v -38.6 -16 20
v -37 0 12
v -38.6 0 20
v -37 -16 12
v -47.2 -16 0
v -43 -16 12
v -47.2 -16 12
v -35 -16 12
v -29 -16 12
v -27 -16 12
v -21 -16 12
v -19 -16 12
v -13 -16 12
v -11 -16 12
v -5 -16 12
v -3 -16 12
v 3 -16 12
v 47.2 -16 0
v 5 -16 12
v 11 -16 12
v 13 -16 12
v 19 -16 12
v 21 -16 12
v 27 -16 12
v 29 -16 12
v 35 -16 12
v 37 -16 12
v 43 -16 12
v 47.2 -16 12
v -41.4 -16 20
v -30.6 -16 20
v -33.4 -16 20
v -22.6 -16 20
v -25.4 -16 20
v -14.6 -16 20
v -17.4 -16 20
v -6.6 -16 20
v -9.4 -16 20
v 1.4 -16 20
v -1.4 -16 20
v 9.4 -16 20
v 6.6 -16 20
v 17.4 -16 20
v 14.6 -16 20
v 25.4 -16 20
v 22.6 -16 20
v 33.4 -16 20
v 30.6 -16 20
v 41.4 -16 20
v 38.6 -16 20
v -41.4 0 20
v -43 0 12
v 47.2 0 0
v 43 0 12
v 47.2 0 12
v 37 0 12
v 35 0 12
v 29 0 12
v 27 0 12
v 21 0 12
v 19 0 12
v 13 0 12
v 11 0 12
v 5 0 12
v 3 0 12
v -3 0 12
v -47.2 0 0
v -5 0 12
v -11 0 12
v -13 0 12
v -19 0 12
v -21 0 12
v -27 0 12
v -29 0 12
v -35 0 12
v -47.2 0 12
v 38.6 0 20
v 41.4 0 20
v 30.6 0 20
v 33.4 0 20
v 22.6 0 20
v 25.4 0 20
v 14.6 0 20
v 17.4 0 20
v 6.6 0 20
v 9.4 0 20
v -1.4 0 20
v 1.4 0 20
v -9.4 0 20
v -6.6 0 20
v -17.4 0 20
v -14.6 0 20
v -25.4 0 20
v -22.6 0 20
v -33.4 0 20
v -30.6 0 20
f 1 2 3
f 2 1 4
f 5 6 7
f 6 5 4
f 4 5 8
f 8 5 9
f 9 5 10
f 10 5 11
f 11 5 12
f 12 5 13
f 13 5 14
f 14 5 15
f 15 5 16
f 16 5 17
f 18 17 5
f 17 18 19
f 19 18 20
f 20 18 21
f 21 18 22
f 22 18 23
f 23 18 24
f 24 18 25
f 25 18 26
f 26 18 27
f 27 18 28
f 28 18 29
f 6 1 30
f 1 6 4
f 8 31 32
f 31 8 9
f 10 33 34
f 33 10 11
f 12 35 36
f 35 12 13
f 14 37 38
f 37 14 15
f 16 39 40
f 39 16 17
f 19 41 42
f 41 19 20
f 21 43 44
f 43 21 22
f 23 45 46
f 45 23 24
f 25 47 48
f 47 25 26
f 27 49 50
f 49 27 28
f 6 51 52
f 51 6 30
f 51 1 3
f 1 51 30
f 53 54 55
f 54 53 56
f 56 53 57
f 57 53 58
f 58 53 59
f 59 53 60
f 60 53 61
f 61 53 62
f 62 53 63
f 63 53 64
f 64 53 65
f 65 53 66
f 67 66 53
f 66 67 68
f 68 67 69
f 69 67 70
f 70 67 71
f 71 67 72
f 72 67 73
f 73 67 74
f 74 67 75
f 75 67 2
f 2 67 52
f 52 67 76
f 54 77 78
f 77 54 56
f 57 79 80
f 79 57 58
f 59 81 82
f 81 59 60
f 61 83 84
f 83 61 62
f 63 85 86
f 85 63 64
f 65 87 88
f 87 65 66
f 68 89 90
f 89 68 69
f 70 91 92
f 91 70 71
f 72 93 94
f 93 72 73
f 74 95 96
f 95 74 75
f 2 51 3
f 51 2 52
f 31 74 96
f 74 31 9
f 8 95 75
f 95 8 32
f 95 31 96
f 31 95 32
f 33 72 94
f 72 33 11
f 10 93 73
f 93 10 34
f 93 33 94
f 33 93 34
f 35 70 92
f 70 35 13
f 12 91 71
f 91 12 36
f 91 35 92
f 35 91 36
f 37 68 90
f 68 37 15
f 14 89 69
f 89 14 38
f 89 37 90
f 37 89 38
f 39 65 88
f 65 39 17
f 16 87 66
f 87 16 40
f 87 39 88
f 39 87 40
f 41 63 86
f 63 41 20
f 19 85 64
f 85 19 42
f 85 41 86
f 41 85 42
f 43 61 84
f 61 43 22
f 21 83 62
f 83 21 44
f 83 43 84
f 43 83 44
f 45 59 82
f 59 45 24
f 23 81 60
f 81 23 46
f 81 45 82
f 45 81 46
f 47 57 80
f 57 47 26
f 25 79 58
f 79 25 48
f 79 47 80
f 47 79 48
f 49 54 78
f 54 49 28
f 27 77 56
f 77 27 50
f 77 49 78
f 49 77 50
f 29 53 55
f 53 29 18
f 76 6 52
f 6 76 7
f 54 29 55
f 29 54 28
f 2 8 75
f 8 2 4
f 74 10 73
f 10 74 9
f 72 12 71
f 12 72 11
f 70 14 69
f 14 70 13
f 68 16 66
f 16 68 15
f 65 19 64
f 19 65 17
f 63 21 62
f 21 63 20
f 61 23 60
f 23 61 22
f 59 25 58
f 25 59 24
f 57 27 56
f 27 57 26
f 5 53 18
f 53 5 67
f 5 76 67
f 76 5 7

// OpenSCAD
$fn = 32;

// ----------------------------------------------------------------------
// Toothed rack, 11 teeth
// 8 mm pitch, 8 mm teeth
// ----------------------------------------------------------------------

// --- parameters (mm) ---
bar_w = 16;     // bar width (Y)
bar_h = 12;     // bar height (Z)
teeth = 11;     // number of teeth
pitch = 8;      // tooth pitch
tooth_h = 8;    // tooth height above the bar
root_w = 6.4;   // tooth width at the root
crest_w = 2.8;  // tooth width at the crest

// --- derived feature positions (mm) ---
span = (teeth - 1) * pitch;  // = 80   distance between the outer teeth
bar_l = span + root_w + 8;   // = 94.4   bar length: teeth plus 4 mm at each end
tooth_x = -span / 2;         // = -40   X of the first tooth
height = bar_h + tooth_h;    // = 20   overall height
feature_centers = [
  [tooth_x + 0 * pitch, -bar_w / 2],
  [tooth_x + 1 * pitch, -bar_w / 2],
  [tooth_x + 2 * pitch, -bar_w / 2],
  [tooth_x + 3 * pitch, -bar_w / 2],
  [tooth_x + 4 * pitch, -bar_w / 2],
  [tooth_x + 5 * pitch, -bar_w / 2],
  [tooth_x + 6 * pitch, -bar_w / 2],
  [tooth_x + 7 * pitch, -bar_w / 2],
  [tooth_x + 8 * pitch, -bar_w / 2],
  [tooth_x + 9 * pitch, -bar_w / 2],
  [tooth_x + 10 * pitch, -bar_w / 2]
];   // tooth centre line, drives the tooth loop

// bar with a rack of teeth, one extruded trapezoium per centre
module rack_tooth() {
  linear_extrude(height = bar_w)
    polygon(points = [
      [0, 0],
      [root_w, 0],
      [root_w / 2 + crest_w / 2, tooth_h + 1],
      [root_w / 2 - crest_w / 2, tooth_h + 1]
    ]);
}

union() {
  translate([-bar_l / 2, -bar_w, 0]) cube([bar_l, bar_w, bar_h]);
  for (centre = feature_centers)
    translate([centre[0] - root_w / 2, 0, bar_h - 1]) rotate([90, 0, 0]) rack_tooth();
}
